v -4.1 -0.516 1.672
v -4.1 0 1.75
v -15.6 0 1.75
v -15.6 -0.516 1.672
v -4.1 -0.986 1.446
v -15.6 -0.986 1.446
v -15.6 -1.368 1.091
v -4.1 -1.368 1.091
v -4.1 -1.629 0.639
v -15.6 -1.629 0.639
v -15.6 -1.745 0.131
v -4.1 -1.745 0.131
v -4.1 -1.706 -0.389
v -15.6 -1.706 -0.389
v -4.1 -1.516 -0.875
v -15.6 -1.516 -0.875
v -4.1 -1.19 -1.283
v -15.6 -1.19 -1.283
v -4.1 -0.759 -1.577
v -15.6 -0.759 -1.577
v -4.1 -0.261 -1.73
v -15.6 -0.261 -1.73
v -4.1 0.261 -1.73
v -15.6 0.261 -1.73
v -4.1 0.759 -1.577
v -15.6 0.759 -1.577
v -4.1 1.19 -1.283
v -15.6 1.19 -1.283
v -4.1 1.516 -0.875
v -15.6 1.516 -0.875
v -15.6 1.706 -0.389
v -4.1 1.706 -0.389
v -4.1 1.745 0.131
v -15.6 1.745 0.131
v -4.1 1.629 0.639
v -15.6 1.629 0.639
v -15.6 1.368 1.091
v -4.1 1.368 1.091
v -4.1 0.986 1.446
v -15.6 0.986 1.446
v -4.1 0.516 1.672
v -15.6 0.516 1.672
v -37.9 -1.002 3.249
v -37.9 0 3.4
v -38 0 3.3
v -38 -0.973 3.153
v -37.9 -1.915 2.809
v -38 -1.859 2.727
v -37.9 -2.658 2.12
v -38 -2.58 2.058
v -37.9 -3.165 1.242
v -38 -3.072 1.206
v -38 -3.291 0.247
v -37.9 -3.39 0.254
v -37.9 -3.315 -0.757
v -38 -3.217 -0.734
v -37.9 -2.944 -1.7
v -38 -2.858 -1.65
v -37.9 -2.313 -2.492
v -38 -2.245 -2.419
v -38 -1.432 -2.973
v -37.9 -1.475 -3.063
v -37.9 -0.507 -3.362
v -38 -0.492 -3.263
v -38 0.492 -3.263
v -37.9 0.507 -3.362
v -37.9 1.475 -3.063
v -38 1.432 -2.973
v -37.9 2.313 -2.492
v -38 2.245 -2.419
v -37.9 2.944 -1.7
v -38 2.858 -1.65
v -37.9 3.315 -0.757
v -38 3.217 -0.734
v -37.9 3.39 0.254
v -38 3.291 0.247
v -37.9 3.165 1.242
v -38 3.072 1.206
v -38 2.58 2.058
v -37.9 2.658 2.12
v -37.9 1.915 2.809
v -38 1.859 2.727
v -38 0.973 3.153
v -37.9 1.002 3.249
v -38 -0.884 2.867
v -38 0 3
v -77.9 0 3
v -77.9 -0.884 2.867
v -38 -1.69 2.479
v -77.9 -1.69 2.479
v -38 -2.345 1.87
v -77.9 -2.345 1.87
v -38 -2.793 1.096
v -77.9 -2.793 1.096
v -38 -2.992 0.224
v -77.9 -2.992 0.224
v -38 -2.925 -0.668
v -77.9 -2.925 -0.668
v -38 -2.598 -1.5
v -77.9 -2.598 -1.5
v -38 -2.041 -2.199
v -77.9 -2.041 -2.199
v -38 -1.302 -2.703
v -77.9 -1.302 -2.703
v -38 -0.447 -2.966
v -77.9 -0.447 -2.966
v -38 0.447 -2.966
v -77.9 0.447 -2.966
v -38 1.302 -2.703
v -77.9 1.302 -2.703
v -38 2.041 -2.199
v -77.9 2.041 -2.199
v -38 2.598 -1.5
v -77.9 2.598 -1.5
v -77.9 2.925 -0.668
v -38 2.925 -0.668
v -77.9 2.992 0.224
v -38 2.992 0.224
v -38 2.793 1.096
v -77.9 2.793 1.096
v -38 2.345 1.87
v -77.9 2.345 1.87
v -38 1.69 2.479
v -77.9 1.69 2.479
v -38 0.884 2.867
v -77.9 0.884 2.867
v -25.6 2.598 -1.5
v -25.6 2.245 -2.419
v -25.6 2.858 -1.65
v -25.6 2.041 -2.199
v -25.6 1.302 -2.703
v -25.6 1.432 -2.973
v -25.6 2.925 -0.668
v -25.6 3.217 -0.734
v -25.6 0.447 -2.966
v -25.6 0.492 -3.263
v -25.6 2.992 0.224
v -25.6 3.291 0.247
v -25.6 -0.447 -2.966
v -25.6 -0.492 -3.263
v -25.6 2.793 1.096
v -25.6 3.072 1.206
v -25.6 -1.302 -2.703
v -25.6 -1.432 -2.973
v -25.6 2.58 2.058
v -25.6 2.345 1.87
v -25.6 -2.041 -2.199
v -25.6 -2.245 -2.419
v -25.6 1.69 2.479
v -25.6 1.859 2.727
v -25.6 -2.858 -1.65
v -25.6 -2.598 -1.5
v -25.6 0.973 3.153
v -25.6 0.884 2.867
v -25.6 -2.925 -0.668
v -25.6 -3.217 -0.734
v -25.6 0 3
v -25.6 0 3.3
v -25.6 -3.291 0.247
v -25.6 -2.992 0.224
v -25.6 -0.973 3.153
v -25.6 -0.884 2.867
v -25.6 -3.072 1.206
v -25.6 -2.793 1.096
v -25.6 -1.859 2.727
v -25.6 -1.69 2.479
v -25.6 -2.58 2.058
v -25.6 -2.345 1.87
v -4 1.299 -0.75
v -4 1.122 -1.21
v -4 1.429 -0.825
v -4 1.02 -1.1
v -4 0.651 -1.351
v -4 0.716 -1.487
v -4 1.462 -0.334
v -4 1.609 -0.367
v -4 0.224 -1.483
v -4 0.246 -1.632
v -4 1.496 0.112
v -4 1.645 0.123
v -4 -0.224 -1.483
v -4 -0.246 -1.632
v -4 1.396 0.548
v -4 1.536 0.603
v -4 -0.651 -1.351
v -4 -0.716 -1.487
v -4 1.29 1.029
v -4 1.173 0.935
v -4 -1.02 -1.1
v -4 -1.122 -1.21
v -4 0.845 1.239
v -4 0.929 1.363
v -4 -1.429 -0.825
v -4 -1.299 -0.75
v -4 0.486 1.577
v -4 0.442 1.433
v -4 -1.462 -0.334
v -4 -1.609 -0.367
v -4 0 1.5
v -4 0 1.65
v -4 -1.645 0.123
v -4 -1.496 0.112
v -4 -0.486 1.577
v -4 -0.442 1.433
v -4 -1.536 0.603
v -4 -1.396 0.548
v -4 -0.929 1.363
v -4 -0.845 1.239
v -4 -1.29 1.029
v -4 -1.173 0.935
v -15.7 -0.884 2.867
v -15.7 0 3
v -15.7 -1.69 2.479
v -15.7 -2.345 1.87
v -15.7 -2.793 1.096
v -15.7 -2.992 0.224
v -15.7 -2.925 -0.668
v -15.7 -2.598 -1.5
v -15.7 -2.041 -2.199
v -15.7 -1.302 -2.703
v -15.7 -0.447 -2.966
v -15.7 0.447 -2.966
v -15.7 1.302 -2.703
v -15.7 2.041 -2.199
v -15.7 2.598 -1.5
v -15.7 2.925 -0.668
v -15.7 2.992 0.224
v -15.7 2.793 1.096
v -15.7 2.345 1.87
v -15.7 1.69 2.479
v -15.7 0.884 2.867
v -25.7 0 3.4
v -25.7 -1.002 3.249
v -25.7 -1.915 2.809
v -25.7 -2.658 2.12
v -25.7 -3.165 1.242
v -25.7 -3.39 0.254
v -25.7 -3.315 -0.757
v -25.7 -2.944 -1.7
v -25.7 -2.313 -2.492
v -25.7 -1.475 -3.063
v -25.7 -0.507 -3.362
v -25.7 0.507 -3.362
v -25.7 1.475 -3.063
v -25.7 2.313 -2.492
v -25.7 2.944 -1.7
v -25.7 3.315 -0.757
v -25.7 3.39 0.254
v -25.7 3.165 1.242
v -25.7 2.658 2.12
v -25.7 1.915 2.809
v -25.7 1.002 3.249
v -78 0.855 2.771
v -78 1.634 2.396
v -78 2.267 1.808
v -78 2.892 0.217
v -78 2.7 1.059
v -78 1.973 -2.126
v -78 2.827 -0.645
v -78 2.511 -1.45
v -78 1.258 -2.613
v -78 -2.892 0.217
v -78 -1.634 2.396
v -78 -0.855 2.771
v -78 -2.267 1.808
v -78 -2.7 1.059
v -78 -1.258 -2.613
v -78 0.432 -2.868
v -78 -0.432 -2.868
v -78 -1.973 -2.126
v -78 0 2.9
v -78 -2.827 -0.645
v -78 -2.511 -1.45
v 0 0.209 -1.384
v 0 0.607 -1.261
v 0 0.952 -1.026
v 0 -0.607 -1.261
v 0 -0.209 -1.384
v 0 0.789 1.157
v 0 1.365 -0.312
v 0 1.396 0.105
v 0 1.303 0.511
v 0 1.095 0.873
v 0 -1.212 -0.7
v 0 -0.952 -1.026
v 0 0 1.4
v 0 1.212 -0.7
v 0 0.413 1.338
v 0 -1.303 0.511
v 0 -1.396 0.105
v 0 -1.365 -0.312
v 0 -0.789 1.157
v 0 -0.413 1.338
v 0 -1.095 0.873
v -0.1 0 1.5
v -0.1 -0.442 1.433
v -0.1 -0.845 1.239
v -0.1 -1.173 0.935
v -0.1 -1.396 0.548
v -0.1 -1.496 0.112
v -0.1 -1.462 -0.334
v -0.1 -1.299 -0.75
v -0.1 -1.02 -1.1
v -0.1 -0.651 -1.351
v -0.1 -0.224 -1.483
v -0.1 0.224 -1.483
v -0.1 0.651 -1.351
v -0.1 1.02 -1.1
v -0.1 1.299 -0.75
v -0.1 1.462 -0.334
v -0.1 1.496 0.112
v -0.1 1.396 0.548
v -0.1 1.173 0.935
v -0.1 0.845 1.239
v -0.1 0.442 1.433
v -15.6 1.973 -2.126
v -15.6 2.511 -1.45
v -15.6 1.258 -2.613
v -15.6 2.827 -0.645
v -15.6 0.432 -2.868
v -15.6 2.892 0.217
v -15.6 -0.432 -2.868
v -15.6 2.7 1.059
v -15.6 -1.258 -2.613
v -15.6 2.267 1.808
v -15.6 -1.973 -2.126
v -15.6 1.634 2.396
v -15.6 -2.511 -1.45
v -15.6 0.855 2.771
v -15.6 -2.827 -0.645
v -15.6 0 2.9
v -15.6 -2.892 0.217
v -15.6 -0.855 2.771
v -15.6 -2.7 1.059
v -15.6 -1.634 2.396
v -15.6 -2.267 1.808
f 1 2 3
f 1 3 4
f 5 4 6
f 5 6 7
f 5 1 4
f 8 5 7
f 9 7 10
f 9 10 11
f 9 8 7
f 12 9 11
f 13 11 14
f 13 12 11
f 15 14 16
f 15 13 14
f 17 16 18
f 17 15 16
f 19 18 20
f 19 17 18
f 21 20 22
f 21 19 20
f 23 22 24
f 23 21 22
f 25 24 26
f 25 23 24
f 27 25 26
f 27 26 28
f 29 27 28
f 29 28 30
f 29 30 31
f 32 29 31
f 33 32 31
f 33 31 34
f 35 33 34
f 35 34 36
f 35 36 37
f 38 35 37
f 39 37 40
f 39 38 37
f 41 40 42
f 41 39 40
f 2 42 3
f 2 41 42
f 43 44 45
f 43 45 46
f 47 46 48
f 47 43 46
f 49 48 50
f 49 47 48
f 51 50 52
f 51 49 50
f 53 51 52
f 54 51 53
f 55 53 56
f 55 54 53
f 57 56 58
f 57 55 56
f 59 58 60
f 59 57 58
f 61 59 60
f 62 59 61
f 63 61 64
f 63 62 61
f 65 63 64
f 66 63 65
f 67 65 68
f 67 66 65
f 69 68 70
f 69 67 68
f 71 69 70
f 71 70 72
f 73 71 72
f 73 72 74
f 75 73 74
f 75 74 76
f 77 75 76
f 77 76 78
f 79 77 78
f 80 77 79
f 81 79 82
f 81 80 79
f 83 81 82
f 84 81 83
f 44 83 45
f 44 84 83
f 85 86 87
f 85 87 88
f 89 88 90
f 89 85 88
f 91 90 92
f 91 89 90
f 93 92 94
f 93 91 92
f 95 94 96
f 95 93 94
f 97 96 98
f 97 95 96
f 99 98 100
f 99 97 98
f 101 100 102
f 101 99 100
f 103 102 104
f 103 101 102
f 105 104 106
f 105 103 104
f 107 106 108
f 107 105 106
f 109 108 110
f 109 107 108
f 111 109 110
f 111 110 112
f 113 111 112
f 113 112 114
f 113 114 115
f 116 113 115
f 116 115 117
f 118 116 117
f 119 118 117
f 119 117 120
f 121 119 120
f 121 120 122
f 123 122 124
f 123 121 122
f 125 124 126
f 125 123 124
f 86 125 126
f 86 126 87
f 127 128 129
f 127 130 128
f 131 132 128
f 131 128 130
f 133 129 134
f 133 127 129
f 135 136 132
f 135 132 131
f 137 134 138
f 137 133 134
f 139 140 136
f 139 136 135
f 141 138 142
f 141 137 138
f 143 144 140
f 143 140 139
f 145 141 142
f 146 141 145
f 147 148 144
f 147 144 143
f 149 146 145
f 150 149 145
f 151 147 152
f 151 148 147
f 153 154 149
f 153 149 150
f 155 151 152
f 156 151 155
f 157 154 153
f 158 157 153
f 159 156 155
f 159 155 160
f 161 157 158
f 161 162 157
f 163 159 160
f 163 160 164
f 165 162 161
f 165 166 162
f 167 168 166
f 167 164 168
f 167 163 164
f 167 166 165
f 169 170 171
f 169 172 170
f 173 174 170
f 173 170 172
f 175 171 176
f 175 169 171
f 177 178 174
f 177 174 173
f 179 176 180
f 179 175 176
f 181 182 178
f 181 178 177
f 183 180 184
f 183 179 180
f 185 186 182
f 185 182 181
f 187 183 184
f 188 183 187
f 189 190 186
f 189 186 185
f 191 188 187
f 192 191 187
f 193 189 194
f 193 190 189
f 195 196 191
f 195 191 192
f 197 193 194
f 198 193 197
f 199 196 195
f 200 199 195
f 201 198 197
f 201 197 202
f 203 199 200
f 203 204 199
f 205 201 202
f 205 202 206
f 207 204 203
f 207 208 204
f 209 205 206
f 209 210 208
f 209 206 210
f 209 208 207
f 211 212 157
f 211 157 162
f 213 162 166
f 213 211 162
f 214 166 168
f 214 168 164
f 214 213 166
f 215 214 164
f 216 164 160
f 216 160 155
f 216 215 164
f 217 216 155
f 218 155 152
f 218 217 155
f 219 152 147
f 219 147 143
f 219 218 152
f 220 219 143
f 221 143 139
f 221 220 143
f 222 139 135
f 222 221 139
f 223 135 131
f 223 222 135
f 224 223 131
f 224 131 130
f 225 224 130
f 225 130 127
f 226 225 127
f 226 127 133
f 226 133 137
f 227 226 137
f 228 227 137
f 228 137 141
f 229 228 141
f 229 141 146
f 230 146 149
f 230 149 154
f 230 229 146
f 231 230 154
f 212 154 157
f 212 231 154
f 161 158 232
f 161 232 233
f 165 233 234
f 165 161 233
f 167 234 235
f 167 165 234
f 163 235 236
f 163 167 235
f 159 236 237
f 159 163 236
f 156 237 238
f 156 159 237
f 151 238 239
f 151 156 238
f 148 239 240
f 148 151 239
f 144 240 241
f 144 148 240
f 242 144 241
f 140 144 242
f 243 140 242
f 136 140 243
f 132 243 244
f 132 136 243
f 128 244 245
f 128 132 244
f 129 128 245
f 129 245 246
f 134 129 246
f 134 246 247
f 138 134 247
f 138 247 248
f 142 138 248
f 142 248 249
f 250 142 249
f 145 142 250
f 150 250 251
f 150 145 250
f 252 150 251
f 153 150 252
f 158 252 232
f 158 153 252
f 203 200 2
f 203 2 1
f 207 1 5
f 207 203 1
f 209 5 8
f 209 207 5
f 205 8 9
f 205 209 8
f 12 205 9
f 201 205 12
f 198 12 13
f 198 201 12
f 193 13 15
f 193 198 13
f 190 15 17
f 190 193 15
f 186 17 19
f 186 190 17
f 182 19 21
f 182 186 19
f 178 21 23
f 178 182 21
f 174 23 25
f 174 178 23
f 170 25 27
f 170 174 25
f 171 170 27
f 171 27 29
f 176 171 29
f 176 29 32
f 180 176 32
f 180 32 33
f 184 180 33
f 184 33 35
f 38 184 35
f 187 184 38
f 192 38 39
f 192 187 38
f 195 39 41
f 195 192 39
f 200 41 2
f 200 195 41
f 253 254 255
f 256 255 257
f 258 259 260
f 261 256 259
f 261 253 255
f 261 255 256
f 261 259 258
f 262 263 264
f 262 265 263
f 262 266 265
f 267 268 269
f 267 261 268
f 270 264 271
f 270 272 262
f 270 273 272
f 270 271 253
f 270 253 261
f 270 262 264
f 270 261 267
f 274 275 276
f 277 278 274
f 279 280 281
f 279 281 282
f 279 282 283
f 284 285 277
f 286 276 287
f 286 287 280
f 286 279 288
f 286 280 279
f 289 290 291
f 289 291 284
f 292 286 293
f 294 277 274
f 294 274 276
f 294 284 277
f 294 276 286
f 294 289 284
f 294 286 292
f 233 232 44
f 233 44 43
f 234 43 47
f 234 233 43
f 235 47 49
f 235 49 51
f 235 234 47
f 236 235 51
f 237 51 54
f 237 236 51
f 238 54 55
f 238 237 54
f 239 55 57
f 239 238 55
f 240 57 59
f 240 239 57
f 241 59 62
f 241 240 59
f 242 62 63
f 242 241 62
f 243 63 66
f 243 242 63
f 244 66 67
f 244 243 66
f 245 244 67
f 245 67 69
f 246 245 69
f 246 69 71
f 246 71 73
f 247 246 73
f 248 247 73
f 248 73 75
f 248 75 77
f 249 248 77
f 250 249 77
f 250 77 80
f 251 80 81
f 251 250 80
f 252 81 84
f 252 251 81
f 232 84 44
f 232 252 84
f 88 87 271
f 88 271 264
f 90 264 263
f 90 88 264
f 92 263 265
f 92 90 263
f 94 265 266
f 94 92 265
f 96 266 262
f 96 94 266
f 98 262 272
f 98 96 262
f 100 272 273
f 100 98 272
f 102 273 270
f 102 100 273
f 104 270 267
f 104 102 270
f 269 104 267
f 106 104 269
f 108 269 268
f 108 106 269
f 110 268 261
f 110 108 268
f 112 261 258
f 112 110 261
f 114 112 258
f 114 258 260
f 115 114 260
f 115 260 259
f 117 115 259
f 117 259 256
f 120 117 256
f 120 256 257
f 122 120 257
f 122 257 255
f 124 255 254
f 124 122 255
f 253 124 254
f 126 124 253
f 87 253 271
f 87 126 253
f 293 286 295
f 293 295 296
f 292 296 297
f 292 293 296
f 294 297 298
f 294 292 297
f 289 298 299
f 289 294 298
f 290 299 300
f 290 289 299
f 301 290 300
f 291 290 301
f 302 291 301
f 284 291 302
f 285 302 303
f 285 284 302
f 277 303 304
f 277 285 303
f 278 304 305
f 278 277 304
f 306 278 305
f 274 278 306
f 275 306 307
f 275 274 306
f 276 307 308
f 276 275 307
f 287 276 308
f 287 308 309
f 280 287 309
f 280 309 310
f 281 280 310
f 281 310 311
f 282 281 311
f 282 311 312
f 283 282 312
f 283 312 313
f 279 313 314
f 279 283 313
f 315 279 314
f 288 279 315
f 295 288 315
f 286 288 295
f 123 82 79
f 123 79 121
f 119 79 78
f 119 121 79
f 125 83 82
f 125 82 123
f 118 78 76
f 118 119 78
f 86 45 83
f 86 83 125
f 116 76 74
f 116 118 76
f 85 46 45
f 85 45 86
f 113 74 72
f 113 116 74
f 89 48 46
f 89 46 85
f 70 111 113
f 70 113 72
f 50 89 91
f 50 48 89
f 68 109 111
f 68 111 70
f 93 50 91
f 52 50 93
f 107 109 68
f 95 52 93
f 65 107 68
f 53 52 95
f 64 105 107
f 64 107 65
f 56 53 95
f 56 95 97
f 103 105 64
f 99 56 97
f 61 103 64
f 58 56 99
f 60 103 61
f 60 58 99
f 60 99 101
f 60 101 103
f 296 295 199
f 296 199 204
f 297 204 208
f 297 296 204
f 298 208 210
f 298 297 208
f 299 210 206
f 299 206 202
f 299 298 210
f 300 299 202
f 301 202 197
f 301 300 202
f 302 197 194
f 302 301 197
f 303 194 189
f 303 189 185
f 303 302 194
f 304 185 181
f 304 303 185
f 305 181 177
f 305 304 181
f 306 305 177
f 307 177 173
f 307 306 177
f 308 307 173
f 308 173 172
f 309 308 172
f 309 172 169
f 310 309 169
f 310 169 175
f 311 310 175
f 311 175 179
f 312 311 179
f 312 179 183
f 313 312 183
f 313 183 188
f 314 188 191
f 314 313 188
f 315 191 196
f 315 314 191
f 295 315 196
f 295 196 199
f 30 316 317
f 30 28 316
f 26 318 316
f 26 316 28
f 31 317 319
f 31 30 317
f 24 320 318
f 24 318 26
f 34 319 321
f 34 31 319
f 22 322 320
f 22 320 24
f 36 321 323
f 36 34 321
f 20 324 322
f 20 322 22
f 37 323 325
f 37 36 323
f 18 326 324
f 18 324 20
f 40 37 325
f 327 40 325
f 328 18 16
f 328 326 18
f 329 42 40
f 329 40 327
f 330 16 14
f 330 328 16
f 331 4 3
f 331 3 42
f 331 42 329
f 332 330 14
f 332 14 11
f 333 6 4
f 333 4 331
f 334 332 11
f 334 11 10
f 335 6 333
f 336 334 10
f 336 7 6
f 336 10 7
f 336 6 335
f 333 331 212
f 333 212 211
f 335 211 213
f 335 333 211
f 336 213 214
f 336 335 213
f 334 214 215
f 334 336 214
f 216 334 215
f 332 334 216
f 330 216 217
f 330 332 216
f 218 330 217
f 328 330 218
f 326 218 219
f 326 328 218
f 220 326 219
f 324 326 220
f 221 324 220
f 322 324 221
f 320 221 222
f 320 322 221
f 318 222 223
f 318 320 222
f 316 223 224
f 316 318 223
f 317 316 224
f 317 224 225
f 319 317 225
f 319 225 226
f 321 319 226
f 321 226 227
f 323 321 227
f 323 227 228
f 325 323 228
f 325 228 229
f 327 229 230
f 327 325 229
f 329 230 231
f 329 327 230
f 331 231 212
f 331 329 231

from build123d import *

# Parameters (mm, degrees)
CHAMFER1_SIZE = 0.1


with BuildPart() as part:
    # Sketch1 → Revolve1 (revolve)
    with BuildSketch(Plane.XY, mode=Mode.PRIVATE) as revolve1_sk:
        Polygon((-25.6, 3), (-15.6, 3), (-15.6, 1.75), (-4, 1.75), (-4, 1.5), (0, 1.5), (0, 0), (-78, 0), (-78, 3), (-38, 3), (-38, 3.4), (-25.6, 3.4), align=None)
    revolve(revolve1_sk.sketch.rotate(Axis((0, 0, 0), (1, 0, 0)), 90), axis=Axis((0, 0, 0), (1, 0, 0)))

    # Chamfer1
    chamfer1_edges = [part.edges().sort_by_distance(p)[0] for p in [
        (-4, 0, -1.75),
        (-15.6, 0, -3),
        (-25.6, 0, -3.4),
        (-38, 0, -3.4),
        (-78, 0, -3),
        (0, 0, -1.5),
    ]]
    chamfer(chamfer1_edges, length=CHAMFER1_SIZE)


solid = part.part
